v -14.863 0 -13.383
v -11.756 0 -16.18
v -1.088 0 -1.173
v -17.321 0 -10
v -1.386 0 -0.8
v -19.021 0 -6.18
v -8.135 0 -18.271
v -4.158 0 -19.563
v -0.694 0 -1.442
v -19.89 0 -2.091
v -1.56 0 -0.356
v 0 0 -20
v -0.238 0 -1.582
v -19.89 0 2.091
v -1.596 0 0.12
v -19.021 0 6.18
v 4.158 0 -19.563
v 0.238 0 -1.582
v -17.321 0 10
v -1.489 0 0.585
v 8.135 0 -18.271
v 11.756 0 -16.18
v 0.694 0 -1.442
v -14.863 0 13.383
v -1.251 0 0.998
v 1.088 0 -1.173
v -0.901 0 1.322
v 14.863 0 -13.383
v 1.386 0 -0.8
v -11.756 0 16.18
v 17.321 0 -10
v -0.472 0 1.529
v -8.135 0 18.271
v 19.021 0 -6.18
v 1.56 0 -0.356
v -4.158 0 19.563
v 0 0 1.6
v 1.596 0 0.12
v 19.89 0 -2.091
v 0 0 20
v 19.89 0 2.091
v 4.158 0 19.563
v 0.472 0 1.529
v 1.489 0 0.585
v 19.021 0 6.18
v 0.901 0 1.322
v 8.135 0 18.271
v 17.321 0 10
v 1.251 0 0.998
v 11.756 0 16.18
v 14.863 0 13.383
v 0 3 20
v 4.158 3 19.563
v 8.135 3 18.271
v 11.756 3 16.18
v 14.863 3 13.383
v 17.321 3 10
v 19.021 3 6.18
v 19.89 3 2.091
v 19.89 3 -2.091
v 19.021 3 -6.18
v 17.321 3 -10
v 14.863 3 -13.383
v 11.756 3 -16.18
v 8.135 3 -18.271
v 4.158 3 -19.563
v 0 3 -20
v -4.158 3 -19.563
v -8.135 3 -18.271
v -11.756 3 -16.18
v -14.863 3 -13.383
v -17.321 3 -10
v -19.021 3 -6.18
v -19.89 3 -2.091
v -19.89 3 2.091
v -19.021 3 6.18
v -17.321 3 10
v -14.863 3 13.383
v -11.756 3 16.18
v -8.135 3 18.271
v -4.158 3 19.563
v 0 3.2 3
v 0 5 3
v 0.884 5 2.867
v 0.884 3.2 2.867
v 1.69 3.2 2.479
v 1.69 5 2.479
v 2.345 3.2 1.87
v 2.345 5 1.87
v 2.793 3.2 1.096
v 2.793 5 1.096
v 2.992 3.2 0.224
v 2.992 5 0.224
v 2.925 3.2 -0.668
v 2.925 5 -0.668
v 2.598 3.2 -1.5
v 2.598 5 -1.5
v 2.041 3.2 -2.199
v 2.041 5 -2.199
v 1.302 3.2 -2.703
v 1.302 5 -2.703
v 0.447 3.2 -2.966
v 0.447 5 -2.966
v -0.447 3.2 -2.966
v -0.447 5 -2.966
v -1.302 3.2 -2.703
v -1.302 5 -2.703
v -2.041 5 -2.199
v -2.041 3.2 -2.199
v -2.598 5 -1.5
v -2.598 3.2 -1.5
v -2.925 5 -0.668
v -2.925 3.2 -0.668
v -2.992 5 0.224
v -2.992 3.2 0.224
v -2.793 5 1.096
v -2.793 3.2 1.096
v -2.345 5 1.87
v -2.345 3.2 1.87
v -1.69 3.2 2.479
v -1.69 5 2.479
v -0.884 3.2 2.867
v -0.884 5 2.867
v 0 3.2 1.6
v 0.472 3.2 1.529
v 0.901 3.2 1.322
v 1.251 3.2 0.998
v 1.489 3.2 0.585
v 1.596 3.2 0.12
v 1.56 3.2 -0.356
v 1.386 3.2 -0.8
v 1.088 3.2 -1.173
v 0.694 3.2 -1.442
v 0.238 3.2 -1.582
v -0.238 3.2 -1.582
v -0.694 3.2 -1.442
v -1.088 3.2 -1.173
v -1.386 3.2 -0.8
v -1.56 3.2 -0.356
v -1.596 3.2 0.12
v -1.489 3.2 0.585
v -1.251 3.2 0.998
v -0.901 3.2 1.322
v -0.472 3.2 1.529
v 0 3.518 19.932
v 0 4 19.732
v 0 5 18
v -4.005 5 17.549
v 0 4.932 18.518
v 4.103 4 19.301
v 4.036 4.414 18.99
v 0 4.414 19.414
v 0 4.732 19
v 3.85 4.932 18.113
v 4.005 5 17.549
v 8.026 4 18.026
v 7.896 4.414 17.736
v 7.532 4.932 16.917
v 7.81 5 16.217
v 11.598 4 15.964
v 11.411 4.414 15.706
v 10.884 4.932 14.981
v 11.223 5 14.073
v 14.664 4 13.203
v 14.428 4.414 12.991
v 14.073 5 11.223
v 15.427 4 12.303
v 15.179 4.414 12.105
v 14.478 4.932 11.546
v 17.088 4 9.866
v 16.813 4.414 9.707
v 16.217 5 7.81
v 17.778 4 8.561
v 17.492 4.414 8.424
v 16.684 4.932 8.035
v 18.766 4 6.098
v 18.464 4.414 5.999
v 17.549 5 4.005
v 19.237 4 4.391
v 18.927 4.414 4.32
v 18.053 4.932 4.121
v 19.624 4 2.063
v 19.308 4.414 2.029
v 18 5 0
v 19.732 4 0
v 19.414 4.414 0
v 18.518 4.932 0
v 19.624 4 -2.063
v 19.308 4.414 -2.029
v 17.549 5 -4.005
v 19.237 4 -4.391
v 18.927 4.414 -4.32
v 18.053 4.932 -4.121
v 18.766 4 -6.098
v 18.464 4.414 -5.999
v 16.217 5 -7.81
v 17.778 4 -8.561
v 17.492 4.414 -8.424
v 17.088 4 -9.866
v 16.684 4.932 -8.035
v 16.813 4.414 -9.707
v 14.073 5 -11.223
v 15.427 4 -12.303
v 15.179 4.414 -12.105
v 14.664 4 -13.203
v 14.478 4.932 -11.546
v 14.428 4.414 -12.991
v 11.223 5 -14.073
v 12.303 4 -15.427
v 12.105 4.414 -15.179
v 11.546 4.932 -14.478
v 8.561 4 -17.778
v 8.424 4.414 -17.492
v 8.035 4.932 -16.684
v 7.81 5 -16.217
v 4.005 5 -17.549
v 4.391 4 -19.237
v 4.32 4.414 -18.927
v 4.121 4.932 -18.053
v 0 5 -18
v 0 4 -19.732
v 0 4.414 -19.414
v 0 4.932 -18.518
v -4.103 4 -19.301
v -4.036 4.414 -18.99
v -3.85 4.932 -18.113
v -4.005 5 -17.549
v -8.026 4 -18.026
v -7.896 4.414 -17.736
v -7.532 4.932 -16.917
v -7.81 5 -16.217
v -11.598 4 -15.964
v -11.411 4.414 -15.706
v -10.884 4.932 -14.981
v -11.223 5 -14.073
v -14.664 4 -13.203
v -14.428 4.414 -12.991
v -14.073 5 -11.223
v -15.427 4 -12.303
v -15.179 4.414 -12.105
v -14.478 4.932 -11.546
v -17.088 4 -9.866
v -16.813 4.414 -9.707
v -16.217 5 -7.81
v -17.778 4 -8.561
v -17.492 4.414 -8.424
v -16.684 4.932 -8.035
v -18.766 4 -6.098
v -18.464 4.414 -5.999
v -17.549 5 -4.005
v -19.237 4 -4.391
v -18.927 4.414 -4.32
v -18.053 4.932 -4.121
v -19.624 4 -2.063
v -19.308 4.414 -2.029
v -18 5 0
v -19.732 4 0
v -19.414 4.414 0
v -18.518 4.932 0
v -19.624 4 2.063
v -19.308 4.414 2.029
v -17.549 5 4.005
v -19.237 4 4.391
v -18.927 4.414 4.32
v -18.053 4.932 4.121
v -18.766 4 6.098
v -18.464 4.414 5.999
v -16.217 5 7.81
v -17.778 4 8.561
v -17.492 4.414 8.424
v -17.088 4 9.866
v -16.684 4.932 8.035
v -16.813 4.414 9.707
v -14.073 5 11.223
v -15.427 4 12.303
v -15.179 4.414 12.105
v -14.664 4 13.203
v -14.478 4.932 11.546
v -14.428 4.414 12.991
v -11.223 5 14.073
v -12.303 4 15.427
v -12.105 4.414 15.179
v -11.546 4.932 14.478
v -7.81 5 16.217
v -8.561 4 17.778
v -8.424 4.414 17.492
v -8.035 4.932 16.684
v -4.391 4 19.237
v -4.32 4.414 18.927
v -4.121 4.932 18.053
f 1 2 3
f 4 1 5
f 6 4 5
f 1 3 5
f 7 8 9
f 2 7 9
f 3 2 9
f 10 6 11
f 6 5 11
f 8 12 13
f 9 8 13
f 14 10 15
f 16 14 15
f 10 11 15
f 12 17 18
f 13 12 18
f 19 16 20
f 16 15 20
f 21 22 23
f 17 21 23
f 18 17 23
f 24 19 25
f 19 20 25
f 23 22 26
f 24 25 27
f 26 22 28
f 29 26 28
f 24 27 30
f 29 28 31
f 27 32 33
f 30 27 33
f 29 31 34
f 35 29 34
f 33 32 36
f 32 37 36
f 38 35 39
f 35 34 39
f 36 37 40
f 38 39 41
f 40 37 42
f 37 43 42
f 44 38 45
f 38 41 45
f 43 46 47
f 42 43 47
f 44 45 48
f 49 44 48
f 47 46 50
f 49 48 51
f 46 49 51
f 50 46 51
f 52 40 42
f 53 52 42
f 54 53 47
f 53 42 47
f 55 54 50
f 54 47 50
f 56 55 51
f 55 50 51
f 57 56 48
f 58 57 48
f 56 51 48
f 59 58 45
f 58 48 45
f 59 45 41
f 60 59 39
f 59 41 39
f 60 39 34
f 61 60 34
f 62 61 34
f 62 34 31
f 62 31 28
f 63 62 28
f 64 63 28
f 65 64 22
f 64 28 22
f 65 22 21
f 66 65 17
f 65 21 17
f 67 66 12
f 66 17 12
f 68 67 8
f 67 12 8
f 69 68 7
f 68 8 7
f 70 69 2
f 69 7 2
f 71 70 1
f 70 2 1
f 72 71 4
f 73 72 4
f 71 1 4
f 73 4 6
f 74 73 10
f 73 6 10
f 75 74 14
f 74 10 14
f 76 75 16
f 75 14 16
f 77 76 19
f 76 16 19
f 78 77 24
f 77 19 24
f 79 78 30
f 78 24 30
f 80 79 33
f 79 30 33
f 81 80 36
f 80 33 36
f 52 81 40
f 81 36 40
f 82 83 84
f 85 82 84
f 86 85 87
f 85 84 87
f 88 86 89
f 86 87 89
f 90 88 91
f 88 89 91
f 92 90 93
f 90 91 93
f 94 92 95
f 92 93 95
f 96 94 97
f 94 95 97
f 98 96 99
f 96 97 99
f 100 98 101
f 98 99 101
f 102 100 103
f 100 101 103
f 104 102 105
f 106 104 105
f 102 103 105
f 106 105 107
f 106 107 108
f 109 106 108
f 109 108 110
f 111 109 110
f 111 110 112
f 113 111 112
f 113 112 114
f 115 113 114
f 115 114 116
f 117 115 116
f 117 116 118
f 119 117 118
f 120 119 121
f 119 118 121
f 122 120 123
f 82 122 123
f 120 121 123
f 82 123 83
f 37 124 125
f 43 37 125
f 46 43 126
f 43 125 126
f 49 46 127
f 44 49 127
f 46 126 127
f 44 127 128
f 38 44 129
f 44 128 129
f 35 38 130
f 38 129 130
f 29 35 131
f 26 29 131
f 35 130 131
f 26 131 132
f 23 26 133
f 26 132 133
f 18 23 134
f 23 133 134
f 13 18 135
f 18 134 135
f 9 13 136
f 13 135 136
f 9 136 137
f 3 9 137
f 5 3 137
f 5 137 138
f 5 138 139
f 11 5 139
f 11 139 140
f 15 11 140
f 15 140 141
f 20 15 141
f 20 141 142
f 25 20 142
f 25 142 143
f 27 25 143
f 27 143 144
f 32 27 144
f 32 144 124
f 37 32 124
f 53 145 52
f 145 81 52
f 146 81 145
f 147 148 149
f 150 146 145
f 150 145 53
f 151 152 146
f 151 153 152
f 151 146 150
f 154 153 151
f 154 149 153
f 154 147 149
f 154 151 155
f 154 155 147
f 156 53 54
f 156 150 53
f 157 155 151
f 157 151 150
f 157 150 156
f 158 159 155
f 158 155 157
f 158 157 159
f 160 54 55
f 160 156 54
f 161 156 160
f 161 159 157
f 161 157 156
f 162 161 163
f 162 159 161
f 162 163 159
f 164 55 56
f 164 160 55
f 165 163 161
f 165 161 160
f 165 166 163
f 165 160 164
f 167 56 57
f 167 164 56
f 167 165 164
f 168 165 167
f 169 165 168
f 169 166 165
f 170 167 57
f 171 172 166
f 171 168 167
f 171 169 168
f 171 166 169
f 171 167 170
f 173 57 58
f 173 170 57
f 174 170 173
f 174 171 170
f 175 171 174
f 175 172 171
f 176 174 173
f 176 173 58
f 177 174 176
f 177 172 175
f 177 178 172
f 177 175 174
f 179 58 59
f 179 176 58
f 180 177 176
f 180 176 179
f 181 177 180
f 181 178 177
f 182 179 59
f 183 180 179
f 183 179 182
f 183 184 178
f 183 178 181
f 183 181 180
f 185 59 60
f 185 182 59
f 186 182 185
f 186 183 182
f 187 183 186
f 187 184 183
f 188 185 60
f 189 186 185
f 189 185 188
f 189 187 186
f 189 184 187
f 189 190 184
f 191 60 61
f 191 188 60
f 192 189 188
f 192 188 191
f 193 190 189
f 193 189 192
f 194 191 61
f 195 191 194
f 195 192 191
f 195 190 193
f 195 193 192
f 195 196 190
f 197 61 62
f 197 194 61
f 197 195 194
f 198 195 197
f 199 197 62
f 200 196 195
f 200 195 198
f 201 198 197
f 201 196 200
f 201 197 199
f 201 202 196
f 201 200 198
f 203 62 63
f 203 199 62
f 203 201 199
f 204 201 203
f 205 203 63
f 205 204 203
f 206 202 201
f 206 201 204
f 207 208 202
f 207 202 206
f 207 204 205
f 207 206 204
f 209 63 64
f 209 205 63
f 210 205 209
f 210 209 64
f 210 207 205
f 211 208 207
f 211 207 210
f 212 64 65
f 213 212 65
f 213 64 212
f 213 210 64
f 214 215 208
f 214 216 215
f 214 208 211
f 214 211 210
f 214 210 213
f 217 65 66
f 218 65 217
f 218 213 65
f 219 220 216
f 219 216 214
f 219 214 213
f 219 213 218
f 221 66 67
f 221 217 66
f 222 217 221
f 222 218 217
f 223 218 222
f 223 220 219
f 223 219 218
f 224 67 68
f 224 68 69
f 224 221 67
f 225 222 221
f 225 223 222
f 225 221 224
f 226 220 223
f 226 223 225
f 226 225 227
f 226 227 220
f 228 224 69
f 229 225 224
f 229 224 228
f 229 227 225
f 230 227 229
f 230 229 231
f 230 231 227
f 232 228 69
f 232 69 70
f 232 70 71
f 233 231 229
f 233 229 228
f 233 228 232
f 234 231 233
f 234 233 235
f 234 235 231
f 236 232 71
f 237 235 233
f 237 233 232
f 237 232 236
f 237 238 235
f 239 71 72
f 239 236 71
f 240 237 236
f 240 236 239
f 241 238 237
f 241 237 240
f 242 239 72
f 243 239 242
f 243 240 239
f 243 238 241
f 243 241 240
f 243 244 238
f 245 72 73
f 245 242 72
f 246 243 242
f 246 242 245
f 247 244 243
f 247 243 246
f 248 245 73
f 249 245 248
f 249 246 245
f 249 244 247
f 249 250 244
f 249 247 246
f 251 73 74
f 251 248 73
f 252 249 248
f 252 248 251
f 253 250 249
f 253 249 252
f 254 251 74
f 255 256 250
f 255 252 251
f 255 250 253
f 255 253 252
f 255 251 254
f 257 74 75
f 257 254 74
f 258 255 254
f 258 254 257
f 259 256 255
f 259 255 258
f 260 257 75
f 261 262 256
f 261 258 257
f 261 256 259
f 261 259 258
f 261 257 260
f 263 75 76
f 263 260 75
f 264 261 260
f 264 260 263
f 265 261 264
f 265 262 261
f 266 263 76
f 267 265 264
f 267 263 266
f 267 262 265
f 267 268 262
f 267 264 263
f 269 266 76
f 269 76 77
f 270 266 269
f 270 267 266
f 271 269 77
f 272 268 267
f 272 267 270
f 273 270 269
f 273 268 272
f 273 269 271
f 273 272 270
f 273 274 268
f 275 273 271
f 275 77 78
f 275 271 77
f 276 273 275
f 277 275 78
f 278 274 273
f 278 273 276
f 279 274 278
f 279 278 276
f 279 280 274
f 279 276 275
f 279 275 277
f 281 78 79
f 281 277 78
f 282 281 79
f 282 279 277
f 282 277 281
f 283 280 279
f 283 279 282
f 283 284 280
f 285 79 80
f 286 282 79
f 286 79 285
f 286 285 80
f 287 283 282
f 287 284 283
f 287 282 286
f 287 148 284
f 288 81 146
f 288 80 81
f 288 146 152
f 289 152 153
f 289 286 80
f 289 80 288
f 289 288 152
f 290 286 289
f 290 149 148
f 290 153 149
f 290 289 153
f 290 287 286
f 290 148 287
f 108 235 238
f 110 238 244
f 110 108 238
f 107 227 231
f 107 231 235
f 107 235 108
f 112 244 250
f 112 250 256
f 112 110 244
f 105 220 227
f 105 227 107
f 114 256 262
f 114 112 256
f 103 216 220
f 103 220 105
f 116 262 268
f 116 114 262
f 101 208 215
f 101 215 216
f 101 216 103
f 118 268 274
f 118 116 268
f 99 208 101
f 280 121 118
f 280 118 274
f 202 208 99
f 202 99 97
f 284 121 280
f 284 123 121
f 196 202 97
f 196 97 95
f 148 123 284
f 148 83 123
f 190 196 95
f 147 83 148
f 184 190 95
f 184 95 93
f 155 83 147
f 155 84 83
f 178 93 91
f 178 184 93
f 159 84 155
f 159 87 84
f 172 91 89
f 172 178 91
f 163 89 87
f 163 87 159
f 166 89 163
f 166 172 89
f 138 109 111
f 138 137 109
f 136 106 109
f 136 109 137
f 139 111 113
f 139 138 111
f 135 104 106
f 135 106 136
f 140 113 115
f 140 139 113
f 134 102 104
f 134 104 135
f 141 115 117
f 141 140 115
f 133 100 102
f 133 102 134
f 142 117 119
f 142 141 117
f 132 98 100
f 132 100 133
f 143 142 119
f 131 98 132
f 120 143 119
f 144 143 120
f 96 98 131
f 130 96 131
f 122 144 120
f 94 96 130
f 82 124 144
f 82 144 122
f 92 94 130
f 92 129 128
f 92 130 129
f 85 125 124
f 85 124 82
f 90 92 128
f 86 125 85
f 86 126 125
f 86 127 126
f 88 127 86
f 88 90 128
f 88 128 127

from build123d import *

# Parameters (mm, degrees)
SKETCH_1_R          = 20
EXTRUDE_1_DEPTH     = 5
FILLET_1_R          = 2
SKETCH_2_R          = 3
CUT_EXTRUDE_1_DEPTH = 1.8
SKETCH_3_R          = 1.6
CUT_EXTRUDE_2_DEPTH = 29.46471507


with BuildPart() as part:
    # 草图1 → 凸台-拉伸1 (new body)
    with BuildSketch(Plane(origin=(0, 0, 0), x_dir=(1, 0, 0), z_dir=(0, 1, 0))):
        with Locations(Location((0, 0, 0), (0, 0, 270))):
            Circle(SKETCH_1_R)
    extrude(amount=EXTRUDE_1_DEPTH)

    # 圆角1
    fillet_1_edges = [part.edges().sort_by_distance(p)[0] for p in [
        (0, 5, -20),
    ]]
    fillet(fillet_1_edges, radius=FILLET_1_R)

    # 草图2 → 切除-拉伸1 (cut)
    with BuildSketch(Plane(origin=(0, 5, 0), x_dir=(1, 0, 0), z_dir=(0, 1, 0))):
        with Locations(Location((0, 0, 0), (0, 0, 270))):
            Circle(SKETCH_2_R)
    extrude(amount=-CUT_EXTRUDE_1_DEPTH, mode=Mode.SUBTRACT)

    # 草图3 → 切除-拉伸2 (cut, through all)
    with BuildSketch(Plane(origin=(0, 3.2, 0), x_dir=(1, 0, 0), z_dir=(0, 1, 0))):
        with Locations(Location((0, 0, 0), (0, 0, 270))):
            Circle(SKETCH_3_R)
    extrude(amount=-CUT_EXTRUDE_2_DEPTH, mode=Mode.SUBTRACT)


solid = part.part
